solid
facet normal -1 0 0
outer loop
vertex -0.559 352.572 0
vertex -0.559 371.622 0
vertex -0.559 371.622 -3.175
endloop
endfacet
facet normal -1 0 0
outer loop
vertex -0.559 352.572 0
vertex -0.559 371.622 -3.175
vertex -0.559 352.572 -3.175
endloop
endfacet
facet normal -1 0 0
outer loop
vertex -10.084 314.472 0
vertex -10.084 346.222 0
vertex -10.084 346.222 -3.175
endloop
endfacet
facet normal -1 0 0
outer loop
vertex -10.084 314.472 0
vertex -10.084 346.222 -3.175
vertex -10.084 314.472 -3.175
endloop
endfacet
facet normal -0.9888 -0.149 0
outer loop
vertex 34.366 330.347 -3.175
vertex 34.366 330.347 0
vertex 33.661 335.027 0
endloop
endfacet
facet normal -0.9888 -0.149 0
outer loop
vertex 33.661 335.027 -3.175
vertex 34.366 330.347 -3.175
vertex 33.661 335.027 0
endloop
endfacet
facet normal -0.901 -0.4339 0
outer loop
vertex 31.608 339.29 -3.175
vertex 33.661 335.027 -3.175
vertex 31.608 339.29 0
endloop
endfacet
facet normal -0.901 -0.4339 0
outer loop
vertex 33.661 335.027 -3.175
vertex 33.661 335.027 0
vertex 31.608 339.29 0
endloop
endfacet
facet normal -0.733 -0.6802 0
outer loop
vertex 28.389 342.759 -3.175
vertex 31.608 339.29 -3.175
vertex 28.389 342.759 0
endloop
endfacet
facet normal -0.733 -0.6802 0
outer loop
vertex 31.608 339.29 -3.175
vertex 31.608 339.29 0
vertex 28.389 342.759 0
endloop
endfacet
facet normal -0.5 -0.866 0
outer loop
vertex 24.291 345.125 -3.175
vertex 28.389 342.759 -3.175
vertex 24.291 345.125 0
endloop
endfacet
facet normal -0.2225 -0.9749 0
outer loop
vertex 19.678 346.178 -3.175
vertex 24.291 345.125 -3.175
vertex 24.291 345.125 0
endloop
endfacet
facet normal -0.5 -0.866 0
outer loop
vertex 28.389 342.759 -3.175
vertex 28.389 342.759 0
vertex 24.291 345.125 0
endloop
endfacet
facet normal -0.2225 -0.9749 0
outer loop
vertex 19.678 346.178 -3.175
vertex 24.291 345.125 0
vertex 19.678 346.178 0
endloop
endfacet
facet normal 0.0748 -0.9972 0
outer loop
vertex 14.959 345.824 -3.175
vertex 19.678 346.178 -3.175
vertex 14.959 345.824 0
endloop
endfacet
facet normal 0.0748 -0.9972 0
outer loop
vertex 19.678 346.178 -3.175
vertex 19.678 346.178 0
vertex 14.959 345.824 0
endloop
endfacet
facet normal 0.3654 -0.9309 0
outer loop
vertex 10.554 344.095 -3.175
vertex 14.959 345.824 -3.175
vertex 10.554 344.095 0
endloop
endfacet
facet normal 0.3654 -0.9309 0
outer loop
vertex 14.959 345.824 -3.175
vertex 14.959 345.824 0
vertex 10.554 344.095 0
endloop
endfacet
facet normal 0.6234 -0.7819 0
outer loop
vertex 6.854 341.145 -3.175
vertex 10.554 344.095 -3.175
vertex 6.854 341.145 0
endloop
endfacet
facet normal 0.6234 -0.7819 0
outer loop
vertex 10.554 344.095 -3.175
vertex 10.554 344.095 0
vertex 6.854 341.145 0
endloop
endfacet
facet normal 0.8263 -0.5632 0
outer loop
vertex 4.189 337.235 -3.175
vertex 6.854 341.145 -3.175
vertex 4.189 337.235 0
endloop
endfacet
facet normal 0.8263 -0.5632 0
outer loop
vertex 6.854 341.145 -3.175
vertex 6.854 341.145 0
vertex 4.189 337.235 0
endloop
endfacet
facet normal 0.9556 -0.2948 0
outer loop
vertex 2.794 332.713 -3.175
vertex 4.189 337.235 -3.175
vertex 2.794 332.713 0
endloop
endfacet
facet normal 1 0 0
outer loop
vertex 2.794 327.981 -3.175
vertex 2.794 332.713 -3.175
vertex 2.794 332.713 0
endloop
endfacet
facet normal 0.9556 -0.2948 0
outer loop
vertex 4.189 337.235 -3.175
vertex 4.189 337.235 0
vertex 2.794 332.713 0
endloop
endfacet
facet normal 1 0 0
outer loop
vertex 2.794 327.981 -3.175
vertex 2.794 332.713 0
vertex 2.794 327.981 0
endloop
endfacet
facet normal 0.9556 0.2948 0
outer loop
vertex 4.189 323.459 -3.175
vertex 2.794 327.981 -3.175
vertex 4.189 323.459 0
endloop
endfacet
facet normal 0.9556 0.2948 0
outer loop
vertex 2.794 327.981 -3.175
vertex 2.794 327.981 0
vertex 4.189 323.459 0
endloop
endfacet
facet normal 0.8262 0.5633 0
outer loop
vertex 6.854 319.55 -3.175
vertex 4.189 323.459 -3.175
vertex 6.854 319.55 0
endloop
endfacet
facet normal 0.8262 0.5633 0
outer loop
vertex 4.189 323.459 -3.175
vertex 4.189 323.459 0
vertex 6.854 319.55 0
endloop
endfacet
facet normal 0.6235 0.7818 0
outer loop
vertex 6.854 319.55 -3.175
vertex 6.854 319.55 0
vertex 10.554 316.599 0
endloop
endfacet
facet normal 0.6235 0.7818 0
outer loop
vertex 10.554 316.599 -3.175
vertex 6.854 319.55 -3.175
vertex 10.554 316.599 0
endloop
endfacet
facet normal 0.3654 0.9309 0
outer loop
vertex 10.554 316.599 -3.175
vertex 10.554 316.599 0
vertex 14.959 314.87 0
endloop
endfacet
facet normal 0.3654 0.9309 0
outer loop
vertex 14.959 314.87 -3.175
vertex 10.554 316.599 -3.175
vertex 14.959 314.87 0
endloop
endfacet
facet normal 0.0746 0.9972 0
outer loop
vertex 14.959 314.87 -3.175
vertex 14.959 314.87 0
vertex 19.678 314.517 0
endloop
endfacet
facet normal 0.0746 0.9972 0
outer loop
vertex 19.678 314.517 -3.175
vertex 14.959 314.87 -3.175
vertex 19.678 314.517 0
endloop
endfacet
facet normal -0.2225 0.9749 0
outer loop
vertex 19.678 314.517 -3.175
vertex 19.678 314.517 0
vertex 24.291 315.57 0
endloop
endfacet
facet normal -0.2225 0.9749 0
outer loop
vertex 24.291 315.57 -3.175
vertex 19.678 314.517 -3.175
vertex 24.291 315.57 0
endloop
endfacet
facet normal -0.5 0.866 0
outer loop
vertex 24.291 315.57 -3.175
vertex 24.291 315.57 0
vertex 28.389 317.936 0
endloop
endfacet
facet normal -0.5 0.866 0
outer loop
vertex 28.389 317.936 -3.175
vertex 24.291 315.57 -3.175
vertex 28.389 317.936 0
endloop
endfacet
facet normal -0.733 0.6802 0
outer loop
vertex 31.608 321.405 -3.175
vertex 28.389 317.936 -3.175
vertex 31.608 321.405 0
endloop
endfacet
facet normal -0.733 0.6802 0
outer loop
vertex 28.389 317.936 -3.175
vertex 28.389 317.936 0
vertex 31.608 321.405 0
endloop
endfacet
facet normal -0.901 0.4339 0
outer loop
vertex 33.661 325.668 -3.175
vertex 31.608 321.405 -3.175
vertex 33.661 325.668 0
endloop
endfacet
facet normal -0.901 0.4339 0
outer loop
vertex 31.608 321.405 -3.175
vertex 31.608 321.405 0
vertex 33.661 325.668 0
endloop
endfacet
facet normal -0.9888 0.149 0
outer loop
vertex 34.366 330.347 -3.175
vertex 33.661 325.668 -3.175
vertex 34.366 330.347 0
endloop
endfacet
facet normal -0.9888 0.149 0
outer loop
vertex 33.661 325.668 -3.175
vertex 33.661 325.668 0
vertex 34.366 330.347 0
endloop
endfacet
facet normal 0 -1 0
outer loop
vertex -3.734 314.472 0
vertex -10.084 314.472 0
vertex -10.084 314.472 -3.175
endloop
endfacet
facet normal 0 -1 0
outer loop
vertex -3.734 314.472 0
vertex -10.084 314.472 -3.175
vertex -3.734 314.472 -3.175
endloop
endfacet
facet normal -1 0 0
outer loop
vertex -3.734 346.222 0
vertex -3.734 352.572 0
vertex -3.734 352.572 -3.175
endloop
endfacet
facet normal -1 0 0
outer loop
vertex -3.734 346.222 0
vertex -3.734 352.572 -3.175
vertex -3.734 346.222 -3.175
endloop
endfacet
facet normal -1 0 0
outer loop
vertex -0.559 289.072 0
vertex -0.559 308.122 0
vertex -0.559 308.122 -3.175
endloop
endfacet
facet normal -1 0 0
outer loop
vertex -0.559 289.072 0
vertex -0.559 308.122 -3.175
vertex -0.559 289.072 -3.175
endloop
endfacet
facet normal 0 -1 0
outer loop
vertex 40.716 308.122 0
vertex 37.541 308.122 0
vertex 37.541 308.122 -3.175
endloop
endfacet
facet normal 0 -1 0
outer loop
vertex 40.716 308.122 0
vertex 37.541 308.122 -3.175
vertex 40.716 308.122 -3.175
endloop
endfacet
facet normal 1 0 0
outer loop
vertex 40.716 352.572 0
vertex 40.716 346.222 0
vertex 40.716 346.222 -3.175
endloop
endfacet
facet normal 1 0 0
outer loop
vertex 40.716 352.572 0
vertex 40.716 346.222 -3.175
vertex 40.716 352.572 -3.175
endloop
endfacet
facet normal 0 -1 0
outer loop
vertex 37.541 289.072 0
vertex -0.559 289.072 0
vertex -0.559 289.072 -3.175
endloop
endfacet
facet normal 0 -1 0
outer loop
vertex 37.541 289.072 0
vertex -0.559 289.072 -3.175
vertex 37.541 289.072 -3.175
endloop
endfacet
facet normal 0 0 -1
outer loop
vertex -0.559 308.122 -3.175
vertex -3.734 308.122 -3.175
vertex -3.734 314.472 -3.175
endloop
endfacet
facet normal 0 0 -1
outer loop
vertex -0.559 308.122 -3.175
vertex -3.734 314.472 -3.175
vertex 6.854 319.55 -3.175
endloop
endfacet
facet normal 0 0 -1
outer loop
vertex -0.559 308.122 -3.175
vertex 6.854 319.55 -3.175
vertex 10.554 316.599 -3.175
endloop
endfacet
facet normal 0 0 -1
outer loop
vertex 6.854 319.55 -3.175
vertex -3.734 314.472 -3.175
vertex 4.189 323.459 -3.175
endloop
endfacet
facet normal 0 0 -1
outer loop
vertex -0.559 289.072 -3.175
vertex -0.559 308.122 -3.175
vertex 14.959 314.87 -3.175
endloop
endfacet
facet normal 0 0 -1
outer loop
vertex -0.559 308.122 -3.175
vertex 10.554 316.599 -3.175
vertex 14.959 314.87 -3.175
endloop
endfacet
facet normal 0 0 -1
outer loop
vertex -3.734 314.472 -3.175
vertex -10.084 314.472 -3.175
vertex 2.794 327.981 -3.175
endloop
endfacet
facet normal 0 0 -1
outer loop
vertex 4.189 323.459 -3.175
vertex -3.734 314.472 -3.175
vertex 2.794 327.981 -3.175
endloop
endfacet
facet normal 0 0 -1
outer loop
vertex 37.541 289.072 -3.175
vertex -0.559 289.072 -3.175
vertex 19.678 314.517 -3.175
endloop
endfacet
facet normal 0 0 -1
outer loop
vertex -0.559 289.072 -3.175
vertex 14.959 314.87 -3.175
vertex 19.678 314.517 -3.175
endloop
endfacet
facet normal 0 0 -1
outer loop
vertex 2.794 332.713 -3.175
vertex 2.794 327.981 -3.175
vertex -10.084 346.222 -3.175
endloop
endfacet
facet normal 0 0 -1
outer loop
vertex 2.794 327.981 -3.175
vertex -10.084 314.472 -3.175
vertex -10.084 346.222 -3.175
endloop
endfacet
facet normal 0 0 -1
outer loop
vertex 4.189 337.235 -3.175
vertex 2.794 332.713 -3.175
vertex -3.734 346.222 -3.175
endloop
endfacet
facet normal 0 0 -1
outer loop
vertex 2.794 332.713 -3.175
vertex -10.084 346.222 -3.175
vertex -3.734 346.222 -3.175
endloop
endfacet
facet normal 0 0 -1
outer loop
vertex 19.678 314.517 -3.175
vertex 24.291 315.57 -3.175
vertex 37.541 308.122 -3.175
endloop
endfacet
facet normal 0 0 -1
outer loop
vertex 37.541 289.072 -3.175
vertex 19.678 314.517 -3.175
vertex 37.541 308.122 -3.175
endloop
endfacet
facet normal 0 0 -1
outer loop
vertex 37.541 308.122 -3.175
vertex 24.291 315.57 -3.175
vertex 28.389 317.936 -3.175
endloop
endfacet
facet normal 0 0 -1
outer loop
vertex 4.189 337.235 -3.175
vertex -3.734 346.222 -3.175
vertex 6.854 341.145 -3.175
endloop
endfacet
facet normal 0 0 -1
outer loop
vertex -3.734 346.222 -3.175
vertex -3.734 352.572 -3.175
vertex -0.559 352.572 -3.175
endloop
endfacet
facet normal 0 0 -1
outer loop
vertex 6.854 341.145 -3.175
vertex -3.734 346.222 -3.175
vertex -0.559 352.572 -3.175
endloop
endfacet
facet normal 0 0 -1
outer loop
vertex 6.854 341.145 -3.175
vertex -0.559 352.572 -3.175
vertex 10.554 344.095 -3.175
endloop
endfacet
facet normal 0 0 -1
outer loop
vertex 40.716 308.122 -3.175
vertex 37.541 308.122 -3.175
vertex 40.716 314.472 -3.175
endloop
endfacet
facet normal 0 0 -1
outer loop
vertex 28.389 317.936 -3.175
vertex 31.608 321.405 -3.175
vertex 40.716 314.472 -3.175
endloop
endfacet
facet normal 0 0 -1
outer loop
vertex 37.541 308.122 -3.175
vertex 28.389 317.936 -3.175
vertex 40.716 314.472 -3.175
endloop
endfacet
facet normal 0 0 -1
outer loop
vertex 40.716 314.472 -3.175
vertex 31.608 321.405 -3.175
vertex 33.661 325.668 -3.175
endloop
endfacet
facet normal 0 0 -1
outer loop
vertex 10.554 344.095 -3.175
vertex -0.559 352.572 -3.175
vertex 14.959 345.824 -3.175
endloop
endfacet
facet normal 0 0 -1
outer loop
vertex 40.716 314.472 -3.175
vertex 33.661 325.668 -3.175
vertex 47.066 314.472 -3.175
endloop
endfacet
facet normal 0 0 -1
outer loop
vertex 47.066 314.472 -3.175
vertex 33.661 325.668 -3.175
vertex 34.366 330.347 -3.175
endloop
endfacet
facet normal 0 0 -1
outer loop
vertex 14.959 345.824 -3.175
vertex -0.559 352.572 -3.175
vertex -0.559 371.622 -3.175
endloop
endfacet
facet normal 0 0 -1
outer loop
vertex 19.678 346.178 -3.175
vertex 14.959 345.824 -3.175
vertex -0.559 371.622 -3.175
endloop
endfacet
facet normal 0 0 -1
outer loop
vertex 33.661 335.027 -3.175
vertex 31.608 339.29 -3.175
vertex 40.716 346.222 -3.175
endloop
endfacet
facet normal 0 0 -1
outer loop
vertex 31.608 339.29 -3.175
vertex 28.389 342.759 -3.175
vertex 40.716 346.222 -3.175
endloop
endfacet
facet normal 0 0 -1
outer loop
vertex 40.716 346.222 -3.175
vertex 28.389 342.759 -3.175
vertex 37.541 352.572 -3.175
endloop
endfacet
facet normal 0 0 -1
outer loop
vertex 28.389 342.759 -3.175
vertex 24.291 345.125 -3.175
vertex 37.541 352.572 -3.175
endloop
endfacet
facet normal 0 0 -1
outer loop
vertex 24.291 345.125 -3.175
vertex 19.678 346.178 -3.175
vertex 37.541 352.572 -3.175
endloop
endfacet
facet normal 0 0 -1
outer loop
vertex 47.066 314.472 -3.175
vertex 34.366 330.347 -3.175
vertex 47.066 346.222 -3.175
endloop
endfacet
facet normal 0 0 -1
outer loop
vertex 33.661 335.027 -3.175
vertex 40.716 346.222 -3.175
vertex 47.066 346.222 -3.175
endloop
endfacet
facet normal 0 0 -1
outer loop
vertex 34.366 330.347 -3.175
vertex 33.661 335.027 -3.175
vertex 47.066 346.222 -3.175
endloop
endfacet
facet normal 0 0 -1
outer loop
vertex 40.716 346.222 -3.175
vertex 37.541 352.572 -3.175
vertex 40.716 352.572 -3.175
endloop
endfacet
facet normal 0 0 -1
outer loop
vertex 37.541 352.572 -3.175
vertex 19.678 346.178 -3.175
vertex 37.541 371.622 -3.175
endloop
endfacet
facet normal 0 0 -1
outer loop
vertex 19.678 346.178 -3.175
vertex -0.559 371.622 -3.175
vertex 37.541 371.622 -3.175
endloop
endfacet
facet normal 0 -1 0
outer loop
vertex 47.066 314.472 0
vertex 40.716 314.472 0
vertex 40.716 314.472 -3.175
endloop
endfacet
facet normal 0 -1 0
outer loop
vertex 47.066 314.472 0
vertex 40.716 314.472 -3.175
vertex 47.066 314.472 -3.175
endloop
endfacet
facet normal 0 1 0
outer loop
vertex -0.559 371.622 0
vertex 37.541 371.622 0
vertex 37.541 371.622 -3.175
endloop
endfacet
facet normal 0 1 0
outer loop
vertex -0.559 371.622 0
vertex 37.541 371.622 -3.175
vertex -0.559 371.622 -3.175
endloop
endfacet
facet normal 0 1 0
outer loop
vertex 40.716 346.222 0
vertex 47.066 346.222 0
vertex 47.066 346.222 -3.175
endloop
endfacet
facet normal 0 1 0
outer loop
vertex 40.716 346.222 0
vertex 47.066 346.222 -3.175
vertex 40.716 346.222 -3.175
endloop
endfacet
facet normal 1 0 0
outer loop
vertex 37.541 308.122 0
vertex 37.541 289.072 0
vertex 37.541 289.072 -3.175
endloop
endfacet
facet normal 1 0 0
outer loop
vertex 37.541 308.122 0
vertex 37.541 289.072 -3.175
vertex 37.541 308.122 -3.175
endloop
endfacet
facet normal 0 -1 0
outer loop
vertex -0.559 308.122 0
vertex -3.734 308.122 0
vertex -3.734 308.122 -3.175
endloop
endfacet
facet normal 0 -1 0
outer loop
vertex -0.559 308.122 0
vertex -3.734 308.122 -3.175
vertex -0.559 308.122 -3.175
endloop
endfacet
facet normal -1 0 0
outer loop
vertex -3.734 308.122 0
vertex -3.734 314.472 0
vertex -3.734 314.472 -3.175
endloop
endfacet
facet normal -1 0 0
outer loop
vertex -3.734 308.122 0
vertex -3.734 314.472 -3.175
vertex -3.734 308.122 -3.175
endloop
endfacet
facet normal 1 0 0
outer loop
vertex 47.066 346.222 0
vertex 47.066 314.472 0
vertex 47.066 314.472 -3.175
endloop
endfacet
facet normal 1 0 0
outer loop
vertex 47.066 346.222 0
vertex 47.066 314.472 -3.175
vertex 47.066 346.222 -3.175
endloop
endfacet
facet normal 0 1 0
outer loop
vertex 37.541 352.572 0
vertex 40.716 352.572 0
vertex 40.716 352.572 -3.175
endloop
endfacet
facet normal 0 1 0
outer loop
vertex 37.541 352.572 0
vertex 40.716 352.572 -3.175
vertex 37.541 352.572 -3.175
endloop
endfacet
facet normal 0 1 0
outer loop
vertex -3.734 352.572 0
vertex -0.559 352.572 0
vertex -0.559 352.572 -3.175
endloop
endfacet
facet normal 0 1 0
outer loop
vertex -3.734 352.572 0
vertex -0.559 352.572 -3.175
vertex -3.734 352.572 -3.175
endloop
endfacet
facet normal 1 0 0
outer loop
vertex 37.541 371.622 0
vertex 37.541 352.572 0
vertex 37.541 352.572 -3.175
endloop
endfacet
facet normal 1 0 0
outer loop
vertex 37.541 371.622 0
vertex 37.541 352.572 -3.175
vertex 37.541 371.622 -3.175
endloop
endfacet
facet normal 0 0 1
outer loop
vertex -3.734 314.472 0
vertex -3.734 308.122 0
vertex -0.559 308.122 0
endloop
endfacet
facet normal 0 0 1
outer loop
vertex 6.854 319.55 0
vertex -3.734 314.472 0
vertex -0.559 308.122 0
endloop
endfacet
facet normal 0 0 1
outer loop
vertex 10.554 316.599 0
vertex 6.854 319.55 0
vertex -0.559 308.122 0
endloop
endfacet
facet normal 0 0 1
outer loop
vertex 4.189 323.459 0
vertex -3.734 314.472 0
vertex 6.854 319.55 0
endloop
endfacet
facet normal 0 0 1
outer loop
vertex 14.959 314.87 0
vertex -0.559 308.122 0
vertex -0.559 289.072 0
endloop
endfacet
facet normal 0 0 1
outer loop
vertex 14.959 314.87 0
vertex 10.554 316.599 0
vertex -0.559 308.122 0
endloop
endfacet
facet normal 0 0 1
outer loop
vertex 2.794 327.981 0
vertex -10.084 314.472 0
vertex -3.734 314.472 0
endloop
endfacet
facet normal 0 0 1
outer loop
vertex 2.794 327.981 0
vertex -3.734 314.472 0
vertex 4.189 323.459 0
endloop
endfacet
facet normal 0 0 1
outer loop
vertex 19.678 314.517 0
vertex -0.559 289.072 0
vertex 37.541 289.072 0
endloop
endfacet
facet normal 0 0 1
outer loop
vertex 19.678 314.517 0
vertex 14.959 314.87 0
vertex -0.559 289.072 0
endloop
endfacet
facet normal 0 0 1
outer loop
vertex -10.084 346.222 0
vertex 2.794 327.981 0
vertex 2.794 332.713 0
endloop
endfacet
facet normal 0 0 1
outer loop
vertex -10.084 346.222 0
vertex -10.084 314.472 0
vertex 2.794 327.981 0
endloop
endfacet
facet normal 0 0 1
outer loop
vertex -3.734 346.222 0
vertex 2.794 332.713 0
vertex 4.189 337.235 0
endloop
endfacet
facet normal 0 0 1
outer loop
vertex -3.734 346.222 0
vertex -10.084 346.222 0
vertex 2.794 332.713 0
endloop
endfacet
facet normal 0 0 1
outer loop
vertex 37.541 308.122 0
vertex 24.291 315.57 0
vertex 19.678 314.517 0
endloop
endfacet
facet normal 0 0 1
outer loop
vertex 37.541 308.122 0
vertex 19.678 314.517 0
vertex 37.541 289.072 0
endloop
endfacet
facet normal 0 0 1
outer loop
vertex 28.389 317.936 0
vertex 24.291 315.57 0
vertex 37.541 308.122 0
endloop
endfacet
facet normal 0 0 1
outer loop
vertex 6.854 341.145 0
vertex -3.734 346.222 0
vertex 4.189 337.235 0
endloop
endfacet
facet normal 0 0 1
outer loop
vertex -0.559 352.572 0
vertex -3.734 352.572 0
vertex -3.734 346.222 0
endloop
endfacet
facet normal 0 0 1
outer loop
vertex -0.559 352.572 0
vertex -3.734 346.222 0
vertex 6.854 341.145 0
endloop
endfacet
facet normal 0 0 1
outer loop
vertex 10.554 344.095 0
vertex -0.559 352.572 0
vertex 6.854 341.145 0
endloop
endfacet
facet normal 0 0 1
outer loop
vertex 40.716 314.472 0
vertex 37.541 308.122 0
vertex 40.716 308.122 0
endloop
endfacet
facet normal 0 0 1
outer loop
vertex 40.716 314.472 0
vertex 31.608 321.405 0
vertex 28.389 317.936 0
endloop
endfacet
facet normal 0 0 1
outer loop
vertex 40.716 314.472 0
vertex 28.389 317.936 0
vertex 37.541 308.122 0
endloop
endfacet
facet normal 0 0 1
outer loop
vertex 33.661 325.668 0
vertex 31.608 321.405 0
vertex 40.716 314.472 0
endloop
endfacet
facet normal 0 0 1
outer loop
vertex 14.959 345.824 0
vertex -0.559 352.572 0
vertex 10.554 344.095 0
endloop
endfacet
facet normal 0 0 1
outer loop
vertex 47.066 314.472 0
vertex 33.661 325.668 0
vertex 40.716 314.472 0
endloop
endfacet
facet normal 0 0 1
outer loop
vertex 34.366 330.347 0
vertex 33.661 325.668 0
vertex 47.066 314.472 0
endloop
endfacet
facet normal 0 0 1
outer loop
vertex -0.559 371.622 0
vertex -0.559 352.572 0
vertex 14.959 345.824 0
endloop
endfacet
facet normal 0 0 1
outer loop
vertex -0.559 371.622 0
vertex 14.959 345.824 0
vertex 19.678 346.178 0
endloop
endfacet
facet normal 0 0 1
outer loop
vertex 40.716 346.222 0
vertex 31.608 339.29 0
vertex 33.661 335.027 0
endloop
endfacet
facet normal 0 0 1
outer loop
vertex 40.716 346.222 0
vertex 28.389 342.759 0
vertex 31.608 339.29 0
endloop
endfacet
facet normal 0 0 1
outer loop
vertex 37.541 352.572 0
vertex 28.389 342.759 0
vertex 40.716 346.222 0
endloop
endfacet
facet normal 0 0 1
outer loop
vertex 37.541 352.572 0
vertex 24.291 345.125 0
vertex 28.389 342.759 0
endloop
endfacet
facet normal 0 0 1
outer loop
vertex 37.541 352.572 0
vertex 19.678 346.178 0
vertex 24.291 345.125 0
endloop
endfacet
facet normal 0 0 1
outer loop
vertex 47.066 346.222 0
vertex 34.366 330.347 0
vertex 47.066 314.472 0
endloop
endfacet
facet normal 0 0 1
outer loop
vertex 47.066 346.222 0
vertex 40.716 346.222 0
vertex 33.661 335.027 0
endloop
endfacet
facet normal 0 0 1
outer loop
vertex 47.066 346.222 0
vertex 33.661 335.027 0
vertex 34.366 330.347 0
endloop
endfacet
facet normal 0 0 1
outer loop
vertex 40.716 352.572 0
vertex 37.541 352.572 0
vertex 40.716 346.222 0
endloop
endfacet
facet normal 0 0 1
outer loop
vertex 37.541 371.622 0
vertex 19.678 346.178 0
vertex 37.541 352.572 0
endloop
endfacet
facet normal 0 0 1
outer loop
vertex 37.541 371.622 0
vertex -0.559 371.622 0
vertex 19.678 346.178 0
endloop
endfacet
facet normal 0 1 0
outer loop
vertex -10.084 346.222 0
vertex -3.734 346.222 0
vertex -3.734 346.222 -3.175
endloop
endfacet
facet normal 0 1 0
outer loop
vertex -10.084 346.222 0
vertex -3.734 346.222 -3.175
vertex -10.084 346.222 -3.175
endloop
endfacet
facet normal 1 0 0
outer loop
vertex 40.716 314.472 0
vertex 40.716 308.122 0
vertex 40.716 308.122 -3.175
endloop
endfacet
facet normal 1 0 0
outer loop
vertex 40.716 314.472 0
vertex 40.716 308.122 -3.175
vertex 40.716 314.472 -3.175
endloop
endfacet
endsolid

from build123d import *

# Parameters (mm, degrees)
SKETCH1_R           = 15.875
BOSS_EXTRUDE1_DEPTH = 3.175


with BuildPart() as part:
    # Sketch1 → Boss-Extrude1 (new body)
    with BuildSketch(Plane.XY):
        Polygon((-0.558515458, 289.07227709), (37.541484542, 289.07227709), (37.541484542, 308.12227709), (40.716484541, 308.12227709), (40.716484541, 314.47227709), (47.06648454, 314.47227709), (47.06648454, 346.22227709), (40.716484541, 346.22227709), (40.716484541, 352.57227709), (37.541484542, 352.57227709), (37.541484542, 371.62227709), (-0.558515458, 371.62227709), (-0.558515458, 352.57227709), (-3.733515459, 352.57227709), (-3.733515459, 346.22227709), (-10.083515458, 346.22227709), (-10.083515458, 314.47227709), (-3.733515459, 314.47227709), (-3.733515459, 308.12227709), (-0.558515458, 308.12227709), align=None)
        with Locations((18.491484542, 330.34727709)):
            Circle(SKETCH1_R, mode=Mode.SUBTRACT)
    extrude(amount=-BOSS_EXTRUDE1_DEPTH)


solid = part.part
